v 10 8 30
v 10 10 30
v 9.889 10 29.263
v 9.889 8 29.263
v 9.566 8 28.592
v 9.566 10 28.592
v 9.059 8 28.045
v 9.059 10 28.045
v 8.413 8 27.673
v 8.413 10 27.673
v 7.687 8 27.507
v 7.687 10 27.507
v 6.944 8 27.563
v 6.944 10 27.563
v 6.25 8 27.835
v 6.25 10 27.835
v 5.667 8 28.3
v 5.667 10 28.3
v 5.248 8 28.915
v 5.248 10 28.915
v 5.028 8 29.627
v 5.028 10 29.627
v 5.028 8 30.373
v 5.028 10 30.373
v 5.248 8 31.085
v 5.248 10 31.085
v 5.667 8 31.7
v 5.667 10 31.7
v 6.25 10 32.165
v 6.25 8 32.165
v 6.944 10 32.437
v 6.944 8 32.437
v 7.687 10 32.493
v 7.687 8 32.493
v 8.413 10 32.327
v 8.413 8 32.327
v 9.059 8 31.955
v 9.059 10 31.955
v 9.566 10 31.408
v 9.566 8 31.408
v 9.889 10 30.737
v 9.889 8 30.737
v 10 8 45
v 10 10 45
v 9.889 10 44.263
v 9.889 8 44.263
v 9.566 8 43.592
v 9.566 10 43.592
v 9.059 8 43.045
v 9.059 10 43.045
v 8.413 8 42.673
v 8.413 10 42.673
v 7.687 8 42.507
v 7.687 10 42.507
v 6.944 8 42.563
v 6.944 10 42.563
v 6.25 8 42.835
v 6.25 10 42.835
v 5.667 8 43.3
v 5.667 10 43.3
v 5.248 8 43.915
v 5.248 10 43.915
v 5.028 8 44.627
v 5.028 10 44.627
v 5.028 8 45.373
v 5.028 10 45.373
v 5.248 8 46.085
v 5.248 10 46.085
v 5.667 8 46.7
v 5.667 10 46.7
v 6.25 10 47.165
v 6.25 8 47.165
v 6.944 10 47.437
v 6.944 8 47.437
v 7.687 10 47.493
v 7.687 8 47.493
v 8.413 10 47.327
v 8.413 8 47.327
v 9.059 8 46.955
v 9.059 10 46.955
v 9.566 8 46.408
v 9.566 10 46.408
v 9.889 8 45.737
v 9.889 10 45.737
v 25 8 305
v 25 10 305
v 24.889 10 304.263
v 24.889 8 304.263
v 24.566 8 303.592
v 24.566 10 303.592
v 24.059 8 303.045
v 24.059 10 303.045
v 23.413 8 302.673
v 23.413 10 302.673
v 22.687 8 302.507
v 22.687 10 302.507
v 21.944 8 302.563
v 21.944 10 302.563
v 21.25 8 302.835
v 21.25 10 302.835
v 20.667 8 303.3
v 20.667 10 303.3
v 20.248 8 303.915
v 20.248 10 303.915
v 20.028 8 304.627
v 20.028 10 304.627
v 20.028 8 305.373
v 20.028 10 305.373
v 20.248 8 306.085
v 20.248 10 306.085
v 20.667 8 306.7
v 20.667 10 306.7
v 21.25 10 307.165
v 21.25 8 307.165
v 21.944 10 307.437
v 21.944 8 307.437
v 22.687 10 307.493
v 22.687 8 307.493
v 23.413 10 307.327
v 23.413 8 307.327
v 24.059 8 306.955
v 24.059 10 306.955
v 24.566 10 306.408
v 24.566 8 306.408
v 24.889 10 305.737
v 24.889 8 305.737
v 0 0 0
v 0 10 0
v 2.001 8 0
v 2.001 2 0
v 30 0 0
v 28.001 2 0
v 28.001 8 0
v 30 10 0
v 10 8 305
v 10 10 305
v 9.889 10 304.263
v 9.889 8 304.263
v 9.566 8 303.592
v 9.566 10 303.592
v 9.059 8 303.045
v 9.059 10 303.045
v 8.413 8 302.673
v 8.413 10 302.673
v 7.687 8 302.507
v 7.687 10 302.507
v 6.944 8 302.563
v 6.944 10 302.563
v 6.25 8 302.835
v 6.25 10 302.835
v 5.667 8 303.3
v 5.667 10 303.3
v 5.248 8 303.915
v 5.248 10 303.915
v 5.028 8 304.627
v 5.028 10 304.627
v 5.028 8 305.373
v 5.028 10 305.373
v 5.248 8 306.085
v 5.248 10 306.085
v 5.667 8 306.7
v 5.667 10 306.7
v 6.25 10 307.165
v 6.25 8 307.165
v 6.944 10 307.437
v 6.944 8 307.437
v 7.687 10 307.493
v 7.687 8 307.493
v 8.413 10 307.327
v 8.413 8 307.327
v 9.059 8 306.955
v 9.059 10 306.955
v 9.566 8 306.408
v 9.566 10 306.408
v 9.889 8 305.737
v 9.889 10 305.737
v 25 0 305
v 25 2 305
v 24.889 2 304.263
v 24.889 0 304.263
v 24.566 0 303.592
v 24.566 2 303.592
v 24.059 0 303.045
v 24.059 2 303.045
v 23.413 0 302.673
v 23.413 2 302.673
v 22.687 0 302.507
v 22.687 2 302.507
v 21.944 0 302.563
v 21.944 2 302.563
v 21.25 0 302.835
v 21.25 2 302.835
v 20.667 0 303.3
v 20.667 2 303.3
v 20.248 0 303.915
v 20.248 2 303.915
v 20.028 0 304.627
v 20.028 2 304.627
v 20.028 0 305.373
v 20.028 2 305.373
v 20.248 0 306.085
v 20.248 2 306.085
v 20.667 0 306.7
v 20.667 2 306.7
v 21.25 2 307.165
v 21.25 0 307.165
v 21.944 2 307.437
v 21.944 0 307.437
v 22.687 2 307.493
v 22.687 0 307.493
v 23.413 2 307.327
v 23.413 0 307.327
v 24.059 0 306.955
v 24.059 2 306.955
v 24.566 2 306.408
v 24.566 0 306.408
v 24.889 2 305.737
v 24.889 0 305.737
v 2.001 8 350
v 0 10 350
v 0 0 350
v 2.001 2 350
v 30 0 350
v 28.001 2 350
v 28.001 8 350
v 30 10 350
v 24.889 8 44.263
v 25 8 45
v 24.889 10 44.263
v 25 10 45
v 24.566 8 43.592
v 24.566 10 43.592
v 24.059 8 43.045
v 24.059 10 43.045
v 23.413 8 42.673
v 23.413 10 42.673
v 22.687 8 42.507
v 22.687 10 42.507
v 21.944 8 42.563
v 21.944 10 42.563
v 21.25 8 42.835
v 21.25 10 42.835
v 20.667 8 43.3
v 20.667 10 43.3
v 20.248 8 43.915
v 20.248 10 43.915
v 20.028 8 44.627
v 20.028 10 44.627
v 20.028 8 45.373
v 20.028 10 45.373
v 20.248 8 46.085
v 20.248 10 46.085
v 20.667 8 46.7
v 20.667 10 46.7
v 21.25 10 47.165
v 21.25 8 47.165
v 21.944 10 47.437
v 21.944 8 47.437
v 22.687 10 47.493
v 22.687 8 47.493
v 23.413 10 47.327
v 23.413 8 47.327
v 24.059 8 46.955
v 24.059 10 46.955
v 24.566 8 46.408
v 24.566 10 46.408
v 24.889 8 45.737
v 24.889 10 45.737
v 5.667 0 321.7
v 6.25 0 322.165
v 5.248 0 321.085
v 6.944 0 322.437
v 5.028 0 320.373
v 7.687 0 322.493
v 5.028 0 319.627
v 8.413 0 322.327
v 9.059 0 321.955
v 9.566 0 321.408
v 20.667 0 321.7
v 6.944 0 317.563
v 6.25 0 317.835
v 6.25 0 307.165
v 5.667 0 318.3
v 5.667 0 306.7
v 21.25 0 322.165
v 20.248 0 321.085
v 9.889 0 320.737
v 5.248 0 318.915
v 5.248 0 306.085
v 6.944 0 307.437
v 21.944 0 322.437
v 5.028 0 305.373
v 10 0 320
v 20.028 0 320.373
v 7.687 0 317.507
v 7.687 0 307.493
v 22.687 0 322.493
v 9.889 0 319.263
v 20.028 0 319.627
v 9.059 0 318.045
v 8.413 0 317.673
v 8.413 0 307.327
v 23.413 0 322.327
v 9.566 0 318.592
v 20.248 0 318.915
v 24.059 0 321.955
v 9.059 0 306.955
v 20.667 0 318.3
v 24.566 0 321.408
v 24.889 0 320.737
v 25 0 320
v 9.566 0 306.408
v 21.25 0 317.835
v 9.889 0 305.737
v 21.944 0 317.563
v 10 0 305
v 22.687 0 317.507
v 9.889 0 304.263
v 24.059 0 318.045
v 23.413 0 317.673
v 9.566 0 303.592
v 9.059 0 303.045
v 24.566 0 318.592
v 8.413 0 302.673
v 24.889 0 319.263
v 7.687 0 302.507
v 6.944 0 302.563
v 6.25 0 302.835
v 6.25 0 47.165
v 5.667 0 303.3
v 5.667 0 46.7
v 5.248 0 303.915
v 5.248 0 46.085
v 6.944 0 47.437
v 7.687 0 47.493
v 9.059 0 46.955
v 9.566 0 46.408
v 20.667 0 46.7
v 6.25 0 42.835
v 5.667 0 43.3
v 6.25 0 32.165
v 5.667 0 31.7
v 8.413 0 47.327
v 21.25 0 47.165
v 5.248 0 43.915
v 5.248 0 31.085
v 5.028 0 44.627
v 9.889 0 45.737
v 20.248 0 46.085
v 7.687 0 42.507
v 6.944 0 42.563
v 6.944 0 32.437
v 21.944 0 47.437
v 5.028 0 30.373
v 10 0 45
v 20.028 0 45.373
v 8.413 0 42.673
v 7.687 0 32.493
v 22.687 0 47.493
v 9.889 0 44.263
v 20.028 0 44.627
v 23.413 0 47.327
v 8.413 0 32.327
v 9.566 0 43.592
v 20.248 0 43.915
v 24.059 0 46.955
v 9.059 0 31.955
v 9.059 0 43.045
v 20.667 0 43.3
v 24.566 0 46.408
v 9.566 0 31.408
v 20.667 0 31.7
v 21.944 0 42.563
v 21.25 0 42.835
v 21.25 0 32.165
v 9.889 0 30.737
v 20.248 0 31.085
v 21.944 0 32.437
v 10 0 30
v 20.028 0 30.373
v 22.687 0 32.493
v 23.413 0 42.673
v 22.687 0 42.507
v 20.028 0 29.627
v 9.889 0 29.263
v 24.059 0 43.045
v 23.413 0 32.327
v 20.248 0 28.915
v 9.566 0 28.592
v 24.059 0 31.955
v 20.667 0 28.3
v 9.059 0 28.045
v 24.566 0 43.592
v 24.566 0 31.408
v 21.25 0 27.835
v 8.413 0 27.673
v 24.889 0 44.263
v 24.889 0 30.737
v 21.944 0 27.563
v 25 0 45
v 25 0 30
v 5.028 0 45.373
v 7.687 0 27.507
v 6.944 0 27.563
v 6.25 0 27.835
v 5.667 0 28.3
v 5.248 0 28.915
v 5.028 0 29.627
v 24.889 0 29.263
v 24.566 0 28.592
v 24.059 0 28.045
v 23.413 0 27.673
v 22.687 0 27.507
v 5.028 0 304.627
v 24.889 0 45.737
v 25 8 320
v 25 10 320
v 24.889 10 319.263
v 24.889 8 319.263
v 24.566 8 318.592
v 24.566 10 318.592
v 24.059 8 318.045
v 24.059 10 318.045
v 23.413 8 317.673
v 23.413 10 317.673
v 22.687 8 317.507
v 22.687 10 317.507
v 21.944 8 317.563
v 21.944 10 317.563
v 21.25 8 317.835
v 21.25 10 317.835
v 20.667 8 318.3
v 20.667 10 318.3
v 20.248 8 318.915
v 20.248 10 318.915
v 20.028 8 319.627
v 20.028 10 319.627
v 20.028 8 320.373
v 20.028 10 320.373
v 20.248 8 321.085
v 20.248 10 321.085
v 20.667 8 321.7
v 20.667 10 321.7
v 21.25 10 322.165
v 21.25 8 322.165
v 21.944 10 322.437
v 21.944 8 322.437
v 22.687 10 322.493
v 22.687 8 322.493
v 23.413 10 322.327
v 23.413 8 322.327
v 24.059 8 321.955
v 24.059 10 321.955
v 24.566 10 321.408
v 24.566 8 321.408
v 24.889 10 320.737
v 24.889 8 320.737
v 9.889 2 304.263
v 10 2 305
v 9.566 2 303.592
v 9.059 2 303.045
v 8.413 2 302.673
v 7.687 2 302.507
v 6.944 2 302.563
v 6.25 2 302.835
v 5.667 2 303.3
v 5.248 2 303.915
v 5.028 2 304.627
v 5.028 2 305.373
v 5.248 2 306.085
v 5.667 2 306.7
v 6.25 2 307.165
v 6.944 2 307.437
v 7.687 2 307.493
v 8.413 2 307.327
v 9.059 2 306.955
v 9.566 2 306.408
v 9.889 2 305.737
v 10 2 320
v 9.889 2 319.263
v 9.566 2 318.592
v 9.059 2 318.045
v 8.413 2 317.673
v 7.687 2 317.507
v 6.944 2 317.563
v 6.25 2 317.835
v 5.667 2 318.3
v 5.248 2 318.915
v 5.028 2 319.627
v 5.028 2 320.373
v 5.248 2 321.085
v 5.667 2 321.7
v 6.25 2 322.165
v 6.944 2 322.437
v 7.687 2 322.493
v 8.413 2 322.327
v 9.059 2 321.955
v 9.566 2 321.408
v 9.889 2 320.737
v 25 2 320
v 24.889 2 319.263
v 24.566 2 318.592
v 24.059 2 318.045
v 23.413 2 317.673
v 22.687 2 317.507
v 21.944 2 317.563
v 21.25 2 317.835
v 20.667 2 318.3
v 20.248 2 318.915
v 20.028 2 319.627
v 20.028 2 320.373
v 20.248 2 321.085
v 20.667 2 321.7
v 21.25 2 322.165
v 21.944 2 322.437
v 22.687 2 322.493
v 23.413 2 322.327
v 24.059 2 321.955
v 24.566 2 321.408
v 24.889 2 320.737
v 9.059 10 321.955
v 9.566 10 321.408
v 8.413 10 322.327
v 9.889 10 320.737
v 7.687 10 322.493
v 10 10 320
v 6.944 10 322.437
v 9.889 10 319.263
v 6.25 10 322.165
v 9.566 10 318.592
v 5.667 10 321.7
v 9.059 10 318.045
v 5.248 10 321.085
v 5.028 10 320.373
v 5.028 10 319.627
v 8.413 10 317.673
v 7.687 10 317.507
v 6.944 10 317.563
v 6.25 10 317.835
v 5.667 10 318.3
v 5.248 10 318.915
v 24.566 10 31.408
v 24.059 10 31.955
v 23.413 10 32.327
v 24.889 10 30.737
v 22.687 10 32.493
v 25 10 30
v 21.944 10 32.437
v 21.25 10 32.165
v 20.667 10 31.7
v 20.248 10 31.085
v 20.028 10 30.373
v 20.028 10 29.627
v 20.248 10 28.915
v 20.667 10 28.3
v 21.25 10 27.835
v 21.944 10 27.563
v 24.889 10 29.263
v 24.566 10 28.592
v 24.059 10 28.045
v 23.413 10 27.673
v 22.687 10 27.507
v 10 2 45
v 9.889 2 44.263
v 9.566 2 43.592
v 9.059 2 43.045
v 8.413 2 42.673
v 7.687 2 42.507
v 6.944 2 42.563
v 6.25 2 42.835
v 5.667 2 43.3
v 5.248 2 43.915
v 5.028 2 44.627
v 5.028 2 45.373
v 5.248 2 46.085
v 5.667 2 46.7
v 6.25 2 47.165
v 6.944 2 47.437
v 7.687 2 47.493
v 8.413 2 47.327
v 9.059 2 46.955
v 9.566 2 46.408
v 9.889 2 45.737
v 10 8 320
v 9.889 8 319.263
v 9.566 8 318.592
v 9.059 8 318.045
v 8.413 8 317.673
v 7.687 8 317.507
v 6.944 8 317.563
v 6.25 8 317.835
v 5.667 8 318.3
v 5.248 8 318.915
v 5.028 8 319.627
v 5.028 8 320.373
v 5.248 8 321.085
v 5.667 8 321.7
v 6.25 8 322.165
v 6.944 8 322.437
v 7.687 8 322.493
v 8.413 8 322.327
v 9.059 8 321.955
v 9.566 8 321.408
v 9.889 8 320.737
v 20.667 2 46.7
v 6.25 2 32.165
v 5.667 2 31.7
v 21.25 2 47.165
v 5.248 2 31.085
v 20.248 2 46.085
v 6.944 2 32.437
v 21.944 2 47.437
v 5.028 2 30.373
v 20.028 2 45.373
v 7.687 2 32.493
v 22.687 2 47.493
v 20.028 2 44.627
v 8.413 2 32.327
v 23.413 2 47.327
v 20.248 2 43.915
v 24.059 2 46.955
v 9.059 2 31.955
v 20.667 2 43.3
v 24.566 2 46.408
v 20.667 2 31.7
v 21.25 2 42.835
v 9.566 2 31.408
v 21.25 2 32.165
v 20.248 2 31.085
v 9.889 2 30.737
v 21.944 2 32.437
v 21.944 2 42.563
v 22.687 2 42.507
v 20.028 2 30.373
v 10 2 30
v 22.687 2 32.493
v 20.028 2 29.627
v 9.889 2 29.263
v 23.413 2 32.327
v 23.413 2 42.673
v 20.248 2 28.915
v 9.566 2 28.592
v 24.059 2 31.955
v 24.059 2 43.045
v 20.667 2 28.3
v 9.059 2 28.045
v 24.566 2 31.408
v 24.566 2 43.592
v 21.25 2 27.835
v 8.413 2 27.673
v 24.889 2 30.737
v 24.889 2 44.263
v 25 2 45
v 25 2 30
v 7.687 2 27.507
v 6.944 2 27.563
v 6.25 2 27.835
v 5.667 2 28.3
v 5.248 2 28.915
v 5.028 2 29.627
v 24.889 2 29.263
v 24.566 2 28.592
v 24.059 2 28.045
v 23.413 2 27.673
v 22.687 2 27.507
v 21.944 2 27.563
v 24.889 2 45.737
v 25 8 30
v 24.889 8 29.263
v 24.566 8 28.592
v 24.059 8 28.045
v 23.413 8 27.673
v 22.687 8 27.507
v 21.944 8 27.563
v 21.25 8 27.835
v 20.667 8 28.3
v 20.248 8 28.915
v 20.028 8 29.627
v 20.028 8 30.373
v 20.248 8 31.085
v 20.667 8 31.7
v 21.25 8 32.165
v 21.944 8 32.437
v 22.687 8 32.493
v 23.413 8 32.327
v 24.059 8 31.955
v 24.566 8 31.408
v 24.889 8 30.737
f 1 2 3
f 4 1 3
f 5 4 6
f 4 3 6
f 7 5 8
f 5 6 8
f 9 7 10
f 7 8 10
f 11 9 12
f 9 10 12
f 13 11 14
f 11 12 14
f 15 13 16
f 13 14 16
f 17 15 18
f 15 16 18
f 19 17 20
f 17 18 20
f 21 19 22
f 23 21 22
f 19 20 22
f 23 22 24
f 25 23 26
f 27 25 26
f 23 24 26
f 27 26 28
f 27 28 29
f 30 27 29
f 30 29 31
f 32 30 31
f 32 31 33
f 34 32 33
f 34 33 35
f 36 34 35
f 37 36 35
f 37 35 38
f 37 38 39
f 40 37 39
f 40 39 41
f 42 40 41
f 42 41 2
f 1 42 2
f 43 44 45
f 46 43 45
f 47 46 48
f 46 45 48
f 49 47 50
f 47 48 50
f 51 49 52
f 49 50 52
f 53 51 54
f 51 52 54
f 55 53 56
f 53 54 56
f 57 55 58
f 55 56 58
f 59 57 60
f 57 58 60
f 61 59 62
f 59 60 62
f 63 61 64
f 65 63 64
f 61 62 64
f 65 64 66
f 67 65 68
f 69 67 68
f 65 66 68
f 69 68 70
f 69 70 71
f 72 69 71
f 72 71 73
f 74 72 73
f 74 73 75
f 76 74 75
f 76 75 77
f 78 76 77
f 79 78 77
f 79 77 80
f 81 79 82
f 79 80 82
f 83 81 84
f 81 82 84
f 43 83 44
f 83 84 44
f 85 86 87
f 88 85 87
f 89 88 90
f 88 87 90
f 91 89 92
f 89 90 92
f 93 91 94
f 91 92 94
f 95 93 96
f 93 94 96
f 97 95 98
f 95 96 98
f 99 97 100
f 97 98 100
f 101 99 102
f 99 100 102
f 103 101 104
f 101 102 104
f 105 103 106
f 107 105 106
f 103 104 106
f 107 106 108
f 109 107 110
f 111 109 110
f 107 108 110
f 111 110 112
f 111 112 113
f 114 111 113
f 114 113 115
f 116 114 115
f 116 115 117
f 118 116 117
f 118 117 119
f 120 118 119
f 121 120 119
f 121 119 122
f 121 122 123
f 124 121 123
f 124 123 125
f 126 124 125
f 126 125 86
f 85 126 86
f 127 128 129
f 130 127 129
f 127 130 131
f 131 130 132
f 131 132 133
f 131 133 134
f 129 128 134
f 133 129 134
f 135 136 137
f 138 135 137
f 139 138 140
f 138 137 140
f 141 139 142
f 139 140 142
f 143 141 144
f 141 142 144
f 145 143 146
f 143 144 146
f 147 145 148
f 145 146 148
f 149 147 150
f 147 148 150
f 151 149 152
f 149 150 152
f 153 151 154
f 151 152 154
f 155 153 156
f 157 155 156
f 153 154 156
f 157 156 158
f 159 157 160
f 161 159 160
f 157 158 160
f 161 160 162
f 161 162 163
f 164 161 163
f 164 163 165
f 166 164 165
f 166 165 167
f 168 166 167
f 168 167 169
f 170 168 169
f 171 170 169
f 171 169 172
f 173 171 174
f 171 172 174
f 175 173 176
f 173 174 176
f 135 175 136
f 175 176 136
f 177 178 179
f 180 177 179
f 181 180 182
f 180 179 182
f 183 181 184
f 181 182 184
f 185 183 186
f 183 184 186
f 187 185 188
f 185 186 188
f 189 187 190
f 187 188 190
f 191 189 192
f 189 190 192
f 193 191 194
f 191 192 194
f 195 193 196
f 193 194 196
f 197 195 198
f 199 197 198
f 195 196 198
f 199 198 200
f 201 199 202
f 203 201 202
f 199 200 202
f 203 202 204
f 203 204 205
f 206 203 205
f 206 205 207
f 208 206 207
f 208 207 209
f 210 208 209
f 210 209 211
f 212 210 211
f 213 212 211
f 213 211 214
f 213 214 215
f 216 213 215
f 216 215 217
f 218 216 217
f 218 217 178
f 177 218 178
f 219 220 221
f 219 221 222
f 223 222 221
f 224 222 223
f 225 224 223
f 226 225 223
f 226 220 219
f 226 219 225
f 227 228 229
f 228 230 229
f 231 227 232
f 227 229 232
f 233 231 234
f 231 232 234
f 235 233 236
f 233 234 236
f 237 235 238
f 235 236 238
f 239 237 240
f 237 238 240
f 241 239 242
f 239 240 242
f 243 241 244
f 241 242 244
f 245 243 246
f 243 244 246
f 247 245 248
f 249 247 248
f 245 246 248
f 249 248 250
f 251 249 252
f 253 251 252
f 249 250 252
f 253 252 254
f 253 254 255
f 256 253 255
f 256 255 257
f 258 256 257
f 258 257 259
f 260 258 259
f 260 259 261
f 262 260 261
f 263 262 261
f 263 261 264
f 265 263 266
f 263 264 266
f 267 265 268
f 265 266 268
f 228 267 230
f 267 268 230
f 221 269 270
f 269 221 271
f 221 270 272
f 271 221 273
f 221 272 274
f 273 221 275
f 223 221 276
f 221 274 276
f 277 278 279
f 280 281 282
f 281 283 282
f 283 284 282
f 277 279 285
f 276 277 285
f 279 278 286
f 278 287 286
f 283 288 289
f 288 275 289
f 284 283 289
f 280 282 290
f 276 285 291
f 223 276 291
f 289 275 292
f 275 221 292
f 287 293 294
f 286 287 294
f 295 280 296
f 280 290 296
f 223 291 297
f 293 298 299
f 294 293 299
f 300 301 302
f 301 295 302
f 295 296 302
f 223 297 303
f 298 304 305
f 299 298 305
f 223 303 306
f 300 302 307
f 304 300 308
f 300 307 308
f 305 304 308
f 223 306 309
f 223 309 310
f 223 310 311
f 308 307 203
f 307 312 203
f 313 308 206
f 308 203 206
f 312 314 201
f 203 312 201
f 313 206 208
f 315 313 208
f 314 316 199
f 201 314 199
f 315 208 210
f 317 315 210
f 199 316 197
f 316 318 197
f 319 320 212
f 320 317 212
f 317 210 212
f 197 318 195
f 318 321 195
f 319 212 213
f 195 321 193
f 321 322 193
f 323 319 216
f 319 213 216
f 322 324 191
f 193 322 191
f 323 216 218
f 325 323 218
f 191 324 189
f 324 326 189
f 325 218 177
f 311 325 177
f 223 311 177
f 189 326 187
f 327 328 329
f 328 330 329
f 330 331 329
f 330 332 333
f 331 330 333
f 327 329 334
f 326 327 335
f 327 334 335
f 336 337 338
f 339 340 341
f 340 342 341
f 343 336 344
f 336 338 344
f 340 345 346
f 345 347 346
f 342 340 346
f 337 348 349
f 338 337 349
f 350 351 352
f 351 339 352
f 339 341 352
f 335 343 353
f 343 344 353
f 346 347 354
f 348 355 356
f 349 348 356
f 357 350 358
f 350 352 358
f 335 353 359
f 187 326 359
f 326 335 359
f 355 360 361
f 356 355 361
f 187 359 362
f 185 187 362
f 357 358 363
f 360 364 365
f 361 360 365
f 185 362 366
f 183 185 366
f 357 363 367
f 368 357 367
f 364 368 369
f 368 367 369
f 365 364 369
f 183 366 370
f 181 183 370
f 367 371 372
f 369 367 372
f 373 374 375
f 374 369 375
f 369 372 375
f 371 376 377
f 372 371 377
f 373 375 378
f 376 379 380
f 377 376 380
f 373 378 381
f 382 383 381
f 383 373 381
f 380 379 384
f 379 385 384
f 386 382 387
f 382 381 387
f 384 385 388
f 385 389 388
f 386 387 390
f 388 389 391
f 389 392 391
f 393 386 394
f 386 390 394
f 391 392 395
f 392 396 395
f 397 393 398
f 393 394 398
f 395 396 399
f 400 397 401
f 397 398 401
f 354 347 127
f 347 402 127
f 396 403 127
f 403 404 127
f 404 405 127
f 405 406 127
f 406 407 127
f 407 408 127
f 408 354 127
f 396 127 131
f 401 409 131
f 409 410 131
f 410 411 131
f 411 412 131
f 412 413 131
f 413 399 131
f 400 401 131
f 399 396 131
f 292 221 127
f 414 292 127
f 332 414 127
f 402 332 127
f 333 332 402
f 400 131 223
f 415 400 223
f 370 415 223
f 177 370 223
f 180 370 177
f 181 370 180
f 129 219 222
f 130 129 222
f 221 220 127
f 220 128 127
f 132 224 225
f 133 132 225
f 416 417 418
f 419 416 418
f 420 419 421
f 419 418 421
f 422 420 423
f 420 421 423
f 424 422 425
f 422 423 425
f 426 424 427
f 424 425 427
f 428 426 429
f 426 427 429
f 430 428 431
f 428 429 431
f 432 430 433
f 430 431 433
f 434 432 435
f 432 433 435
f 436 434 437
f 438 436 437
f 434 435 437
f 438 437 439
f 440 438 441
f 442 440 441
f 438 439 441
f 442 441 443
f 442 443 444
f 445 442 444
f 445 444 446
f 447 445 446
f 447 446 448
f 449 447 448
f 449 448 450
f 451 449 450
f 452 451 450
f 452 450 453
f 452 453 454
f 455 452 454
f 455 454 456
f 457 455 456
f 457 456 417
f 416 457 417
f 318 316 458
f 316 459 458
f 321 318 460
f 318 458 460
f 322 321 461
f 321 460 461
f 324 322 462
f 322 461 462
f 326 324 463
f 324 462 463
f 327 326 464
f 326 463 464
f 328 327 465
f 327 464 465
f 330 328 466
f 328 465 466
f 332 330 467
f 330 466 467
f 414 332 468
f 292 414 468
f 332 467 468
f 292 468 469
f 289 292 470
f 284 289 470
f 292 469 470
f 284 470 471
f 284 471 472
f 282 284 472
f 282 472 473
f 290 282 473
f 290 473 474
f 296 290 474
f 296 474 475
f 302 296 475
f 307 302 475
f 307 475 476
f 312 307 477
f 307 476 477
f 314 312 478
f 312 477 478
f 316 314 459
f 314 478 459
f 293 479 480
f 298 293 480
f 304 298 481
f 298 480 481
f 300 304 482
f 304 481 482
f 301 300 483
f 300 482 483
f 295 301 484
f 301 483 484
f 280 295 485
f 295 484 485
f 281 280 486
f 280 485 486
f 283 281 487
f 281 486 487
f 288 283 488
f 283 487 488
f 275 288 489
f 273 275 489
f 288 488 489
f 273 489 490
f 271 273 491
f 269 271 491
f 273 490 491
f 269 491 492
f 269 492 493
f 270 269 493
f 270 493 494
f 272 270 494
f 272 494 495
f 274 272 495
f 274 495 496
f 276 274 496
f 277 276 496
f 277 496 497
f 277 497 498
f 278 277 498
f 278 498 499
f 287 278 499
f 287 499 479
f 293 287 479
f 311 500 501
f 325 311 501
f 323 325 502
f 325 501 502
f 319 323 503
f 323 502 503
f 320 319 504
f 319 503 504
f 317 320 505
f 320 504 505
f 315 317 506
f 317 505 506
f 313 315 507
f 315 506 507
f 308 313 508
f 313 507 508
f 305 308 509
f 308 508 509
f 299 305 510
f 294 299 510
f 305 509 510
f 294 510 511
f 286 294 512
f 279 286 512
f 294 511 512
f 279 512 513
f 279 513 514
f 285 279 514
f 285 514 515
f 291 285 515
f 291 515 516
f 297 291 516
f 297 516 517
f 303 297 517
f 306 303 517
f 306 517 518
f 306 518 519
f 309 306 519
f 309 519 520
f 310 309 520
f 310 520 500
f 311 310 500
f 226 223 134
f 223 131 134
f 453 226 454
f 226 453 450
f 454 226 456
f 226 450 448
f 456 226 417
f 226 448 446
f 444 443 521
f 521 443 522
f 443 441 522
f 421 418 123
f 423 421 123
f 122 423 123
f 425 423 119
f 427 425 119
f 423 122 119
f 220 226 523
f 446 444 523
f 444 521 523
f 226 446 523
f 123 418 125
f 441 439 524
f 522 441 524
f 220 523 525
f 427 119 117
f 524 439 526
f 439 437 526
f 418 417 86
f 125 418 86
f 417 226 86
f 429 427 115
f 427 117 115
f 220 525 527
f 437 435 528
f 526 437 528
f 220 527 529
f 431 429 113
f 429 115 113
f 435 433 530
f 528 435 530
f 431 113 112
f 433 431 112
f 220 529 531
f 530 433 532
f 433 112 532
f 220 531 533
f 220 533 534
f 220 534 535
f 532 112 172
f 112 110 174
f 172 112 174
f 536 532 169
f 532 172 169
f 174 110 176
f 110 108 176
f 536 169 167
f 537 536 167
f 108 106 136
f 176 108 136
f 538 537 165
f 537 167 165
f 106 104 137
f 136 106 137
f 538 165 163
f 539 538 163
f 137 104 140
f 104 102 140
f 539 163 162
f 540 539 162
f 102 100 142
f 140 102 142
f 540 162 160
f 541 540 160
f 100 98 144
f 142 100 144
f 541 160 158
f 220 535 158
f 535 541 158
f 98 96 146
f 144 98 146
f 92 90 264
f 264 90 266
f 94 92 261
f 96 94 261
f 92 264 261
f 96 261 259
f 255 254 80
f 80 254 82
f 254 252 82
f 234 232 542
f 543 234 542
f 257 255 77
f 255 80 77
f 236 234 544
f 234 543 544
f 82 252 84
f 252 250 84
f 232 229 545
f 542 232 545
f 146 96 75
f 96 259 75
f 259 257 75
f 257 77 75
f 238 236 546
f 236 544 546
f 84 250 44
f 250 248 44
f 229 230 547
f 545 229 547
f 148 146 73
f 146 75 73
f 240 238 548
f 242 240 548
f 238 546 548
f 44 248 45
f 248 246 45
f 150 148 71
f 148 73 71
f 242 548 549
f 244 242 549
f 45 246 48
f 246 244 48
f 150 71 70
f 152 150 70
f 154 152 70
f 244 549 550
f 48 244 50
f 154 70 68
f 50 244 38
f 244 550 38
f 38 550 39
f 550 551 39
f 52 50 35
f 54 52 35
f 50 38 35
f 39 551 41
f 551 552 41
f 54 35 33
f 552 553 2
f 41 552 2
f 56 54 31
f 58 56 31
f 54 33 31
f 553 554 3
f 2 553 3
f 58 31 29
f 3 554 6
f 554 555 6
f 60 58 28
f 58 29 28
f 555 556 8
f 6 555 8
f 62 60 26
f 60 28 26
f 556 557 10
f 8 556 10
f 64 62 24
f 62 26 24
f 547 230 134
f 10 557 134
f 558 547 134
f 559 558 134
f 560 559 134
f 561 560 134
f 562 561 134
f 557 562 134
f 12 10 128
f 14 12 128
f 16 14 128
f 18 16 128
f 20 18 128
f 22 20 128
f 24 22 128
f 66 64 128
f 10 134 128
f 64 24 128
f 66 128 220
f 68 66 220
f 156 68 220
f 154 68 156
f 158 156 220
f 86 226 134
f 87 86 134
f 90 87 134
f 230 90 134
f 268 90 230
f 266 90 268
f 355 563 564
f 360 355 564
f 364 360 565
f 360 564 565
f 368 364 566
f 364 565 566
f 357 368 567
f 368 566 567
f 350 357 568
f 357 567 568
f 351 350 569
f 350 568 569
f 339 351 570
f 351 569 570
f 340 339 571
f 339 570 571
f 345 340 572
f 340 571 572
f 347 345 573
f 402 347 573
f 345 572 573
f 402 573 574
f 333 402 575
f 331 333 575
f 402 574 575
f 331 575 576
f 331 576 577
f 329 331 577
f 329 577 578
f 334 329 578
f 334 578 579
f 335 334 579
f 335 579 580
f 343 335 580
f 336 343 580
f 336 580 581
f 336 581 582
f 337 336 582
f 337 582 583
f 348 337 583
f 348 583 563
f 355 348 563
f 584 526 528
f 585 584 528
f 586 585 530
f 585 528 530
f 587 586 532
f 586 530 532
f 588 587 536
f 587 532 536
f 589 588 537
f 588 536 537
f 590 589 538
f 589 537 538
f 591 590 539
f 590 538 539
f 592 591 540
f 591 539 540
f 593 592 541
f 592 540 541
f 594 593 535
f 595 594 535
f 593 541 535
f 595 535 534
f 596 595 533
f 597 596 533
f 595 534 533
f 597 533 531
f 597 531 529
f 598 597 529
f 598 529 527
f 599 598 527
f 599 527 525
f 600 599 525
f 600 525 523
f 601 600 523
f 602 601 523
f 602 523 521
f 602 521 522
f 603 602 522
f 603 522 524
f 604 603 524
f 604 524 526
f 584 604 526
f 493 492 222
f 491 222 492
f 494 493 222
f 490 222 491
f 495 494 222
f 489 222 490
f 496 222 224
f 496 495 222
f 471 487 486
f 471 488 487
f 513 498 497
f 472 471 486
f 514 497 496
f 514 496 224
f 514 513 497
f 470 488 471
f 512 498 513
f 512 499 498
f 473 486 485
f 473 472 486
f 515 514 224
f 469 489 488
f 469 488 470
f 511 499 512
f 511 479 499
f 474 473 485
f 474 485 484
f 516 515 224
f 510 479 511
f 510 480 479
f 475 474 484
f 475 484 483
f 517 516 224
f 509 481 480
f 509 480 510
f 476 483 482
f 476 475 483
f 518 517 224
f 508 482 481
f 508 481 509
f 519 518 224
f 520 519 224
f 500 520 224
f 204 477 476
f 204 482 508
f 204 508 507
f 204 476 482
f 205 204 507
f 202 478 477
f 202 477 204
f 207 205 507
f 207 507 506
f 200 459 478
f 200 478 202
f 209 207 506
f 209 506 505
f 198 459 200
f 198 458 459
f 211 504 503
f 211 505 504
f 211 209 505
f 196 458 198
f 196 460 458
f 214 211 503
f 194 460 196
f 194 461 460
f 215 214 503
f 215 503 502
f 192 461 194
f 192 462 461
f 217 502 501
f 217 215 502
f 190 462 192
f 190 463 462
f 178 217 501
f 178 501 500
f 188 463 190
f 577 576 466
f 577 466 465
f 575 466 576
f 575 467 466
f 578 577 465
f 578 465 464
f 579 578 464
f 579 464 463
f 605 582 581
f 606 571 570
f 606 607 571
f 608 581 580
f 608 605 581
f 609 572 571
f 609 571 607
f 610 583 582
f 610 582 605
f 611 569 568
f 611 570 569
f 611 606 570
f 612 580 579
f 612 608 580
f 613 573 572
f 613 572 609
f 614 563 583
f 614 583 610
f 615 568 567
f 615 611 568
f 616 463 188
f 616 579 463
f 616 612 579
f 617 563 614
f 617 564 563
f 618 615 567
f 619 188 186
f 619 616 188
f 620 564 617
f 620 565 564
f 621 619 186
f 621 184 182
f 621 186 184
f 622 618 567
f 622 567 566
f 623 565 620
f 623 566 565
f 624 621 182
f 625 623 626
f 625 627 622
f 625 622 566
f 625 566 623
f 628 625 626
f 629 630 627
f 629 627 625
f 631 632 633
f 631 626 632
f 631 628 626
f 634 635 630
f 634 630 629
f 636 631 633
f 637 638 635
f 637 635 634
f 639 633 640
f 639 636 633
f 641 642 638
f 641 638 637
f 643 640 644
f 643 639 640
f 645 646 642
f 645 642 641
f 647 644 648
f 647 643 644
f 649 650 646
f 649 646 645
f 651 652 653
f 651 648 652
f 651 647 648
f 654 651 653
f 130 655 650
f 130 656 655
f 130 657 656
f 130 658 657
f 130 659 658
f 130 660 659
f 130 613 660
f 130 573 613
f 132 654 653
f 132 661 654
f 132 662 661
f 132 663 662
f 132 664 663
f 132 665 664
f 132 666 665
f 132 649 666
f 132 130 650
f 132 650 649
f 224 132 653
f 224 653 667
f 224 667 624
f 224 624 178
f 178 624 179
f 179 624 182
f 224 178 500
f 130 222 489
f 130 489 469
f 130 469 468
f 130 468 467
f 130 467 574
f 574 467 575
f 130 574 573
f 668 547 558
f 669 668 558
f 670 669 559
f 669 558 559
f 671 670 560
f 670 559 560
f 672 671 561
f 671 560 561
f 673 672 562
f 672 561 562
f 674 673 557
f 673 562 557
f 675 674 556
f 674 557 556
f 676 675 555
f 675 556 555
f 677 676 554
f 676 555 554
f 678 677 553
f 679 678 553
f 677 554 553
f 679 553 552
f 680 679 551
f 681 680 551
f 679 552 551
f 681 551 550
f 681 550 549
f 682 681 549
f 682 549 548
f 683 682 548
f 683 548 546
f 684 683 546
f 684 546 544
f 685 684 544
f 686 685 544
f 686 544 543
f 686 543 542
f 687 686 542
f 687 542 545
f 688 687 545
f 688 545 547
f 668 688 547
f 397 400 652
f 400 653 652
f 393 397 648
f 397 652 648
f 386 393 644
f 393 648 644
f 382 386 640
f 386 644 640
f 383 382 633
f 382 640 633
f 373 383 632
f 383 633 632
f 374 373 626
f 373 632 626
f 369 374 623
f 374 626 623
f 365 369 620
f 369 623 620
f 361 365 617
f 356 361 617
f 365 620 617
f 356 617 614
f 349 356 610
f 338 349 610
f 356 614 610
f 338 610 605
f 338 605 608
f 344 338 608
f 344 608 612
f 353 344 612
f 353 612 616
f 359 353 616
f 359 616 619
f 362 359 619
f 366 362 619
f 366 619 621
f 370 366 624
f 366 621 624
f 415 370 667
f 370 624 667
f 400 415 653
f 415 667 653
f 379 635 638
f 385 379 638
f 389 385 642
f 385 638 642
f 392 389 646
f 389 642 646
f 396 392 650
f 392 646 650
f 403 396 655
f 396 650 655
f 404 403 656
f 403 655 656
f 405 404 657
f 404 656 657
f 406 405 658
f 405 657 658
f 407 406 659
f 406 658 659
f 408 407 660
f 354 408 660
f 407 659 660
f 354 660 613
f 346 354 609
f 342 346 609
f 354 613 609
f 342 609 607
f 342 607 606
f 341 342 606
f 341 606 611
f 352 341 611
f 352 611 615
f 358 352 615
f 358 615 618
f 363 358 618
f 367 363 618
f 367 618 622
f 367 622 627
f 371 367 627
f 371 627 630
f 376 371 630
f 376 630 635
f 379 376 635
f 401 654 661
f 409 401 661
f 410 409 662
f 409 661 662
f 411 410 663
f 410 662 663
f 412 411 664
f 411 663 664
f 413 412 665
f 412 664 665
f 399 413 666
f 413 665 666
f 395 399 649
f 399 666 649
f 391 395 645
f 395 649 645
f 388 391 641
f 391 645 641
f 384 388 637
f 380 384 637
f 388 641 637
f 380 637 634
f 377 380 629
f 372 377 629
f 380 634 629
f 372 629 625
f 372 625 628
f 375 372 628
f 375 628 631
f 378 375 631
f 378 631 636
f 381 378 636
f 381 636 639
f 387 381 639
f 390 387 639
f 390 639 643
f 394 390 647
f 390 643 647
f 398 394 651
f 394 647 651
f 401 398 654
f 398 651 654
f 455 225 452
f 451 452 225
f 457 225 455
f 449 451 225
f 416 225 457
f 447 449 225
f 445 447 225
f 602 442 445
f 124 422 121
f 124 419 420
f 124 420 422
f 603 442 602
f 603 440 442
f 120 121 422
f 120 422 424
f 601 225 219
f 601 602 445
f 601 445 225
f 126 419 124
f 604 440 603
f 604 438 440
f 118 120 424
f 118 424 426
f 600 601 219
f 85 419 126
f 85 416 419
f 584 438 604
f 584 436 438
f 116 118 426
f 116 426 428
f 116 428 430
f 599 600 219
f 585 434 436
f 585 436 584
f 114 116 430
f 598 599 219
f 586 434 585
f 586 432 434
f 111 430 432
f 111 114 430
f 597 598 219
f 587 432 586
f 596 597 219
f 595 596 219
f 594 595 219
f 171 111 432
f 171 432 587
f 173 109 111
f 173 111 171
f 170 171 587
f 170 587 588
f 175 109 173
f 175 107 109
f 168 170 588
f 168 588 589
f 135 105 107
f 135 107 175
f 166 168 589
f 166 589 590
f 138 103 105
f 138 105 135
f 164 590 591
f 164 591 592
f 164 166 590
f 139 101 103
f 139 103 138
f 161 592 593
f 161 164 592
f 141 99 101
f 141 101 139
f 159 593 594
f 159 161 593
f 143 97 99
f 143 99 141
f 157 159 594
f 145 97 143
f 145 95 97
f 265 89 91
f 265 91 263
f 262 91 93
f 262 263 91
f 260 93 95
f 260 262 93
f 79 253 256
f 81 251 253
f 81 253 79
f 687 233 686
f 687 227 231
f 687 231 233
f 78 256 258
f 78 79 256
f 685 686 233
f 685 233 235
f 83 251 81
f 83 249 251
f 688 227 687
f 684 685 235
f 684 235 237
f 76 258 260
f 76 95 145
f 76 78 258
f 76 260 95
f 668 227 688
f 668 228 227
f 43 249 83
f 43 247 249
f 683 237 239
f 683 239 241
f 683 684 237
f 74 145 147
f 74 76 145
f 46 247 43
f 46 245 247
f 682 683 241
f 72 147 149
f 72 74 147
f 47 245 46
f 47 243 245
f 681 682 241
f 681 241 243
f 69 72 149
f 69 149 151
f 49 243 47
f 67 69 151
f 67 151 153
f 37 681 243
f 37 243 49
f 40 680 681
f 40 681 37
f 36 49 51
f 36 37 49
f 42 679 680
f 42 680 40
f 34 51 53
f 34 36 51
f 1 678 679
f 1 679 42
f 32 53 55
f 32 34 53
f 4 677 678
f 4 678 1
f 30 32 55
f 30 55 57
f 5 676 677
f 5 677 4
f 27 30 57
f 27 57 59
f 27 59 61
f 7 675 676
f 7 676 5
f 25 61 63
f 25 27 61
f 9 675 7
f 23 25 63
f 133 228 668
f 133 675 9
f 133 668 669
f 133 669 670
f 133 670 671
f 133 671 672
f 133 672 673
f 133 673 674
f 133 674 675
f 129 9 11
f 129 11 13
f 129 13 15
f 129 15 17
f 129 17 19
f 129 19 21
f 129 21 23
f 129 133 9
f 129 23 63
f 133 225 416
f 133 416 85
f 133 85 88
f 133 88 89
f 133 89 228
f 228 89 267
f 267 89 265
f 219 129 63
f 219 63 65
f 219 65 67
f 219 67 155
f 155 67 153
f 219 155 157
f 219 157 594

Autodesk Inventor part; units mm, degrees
ref_plane "YZ Plane" through (0, 0, 0) normal (1, 0, 0) x (0, 1, 0)
ref_plane "XZ Plane" through (0, 0, 0) normal (0, 1, 0) x (-1, 0, 0)
ref_plane "XY Plane" through (0, 0, 0) normal (0, 0, 1) x (1, 0, 0)
sketch "Sketch2" plane through (0, 0, 0) normal (0, 0, 1) x (1, 0, 0)
  line L0 (0, 0) -> (30, 0)
  line L1 (30, 0) -> (30, 10)
  line L2 (30, 10) -> (0, 10)
  line L3 (0, 10) -> (0, 0)
  line L4 (2.0014, 2) -> (28.0014, 2)
  line L5 (28.0014, 2) -> (28.0014, 8)
  line L6 (28.0014, 8) -> (2.0014, 8)
  line L7 (2.0014, 8) -> (2.0014, 2)
  dimension "d0" = 30
  dimension "d1" = 10
  dimension "d2" = 26
  dimension "d3" = 6
extrude "Extrusion1" add sketch "Sketch2" along normal blind 350
sketch "Sketch3" plane through (0, 10, 0) normal (0, 1, 0) x (1, 0, 0)
  circle A0 centre (7.5, -30) radius 2.5
  circle A1 centre (22.5, -30) radius 2.5
  circle A2 centre (7.5, -45) radius 2.5
  circle A3 centre (22.5, -45) radius 2.5
  circle A4 centre (7.5, -320) radius 2.5
  circle A5 centre (22.5, -320) radius 2.5
  circle A6 centre (7.5, -305) radius 2.5
  circle A7 centre (22.5, -305) radius 2.5
  point P0 (0, 0)
  dimension "d6" = 5
  dimension "d7" = 5
  dimension "d8" = 5
  dimension "d9" = 5
  dimension "d10" = 5
  dimension "d11" = 5
  dimension "d12" = 5
  dimension "d13" = 5
extrude "Extrusion2" cut sketch "Sketch3" against normal blind 169.1125
properties part number "long_frame" material "Aluminum 6061"
